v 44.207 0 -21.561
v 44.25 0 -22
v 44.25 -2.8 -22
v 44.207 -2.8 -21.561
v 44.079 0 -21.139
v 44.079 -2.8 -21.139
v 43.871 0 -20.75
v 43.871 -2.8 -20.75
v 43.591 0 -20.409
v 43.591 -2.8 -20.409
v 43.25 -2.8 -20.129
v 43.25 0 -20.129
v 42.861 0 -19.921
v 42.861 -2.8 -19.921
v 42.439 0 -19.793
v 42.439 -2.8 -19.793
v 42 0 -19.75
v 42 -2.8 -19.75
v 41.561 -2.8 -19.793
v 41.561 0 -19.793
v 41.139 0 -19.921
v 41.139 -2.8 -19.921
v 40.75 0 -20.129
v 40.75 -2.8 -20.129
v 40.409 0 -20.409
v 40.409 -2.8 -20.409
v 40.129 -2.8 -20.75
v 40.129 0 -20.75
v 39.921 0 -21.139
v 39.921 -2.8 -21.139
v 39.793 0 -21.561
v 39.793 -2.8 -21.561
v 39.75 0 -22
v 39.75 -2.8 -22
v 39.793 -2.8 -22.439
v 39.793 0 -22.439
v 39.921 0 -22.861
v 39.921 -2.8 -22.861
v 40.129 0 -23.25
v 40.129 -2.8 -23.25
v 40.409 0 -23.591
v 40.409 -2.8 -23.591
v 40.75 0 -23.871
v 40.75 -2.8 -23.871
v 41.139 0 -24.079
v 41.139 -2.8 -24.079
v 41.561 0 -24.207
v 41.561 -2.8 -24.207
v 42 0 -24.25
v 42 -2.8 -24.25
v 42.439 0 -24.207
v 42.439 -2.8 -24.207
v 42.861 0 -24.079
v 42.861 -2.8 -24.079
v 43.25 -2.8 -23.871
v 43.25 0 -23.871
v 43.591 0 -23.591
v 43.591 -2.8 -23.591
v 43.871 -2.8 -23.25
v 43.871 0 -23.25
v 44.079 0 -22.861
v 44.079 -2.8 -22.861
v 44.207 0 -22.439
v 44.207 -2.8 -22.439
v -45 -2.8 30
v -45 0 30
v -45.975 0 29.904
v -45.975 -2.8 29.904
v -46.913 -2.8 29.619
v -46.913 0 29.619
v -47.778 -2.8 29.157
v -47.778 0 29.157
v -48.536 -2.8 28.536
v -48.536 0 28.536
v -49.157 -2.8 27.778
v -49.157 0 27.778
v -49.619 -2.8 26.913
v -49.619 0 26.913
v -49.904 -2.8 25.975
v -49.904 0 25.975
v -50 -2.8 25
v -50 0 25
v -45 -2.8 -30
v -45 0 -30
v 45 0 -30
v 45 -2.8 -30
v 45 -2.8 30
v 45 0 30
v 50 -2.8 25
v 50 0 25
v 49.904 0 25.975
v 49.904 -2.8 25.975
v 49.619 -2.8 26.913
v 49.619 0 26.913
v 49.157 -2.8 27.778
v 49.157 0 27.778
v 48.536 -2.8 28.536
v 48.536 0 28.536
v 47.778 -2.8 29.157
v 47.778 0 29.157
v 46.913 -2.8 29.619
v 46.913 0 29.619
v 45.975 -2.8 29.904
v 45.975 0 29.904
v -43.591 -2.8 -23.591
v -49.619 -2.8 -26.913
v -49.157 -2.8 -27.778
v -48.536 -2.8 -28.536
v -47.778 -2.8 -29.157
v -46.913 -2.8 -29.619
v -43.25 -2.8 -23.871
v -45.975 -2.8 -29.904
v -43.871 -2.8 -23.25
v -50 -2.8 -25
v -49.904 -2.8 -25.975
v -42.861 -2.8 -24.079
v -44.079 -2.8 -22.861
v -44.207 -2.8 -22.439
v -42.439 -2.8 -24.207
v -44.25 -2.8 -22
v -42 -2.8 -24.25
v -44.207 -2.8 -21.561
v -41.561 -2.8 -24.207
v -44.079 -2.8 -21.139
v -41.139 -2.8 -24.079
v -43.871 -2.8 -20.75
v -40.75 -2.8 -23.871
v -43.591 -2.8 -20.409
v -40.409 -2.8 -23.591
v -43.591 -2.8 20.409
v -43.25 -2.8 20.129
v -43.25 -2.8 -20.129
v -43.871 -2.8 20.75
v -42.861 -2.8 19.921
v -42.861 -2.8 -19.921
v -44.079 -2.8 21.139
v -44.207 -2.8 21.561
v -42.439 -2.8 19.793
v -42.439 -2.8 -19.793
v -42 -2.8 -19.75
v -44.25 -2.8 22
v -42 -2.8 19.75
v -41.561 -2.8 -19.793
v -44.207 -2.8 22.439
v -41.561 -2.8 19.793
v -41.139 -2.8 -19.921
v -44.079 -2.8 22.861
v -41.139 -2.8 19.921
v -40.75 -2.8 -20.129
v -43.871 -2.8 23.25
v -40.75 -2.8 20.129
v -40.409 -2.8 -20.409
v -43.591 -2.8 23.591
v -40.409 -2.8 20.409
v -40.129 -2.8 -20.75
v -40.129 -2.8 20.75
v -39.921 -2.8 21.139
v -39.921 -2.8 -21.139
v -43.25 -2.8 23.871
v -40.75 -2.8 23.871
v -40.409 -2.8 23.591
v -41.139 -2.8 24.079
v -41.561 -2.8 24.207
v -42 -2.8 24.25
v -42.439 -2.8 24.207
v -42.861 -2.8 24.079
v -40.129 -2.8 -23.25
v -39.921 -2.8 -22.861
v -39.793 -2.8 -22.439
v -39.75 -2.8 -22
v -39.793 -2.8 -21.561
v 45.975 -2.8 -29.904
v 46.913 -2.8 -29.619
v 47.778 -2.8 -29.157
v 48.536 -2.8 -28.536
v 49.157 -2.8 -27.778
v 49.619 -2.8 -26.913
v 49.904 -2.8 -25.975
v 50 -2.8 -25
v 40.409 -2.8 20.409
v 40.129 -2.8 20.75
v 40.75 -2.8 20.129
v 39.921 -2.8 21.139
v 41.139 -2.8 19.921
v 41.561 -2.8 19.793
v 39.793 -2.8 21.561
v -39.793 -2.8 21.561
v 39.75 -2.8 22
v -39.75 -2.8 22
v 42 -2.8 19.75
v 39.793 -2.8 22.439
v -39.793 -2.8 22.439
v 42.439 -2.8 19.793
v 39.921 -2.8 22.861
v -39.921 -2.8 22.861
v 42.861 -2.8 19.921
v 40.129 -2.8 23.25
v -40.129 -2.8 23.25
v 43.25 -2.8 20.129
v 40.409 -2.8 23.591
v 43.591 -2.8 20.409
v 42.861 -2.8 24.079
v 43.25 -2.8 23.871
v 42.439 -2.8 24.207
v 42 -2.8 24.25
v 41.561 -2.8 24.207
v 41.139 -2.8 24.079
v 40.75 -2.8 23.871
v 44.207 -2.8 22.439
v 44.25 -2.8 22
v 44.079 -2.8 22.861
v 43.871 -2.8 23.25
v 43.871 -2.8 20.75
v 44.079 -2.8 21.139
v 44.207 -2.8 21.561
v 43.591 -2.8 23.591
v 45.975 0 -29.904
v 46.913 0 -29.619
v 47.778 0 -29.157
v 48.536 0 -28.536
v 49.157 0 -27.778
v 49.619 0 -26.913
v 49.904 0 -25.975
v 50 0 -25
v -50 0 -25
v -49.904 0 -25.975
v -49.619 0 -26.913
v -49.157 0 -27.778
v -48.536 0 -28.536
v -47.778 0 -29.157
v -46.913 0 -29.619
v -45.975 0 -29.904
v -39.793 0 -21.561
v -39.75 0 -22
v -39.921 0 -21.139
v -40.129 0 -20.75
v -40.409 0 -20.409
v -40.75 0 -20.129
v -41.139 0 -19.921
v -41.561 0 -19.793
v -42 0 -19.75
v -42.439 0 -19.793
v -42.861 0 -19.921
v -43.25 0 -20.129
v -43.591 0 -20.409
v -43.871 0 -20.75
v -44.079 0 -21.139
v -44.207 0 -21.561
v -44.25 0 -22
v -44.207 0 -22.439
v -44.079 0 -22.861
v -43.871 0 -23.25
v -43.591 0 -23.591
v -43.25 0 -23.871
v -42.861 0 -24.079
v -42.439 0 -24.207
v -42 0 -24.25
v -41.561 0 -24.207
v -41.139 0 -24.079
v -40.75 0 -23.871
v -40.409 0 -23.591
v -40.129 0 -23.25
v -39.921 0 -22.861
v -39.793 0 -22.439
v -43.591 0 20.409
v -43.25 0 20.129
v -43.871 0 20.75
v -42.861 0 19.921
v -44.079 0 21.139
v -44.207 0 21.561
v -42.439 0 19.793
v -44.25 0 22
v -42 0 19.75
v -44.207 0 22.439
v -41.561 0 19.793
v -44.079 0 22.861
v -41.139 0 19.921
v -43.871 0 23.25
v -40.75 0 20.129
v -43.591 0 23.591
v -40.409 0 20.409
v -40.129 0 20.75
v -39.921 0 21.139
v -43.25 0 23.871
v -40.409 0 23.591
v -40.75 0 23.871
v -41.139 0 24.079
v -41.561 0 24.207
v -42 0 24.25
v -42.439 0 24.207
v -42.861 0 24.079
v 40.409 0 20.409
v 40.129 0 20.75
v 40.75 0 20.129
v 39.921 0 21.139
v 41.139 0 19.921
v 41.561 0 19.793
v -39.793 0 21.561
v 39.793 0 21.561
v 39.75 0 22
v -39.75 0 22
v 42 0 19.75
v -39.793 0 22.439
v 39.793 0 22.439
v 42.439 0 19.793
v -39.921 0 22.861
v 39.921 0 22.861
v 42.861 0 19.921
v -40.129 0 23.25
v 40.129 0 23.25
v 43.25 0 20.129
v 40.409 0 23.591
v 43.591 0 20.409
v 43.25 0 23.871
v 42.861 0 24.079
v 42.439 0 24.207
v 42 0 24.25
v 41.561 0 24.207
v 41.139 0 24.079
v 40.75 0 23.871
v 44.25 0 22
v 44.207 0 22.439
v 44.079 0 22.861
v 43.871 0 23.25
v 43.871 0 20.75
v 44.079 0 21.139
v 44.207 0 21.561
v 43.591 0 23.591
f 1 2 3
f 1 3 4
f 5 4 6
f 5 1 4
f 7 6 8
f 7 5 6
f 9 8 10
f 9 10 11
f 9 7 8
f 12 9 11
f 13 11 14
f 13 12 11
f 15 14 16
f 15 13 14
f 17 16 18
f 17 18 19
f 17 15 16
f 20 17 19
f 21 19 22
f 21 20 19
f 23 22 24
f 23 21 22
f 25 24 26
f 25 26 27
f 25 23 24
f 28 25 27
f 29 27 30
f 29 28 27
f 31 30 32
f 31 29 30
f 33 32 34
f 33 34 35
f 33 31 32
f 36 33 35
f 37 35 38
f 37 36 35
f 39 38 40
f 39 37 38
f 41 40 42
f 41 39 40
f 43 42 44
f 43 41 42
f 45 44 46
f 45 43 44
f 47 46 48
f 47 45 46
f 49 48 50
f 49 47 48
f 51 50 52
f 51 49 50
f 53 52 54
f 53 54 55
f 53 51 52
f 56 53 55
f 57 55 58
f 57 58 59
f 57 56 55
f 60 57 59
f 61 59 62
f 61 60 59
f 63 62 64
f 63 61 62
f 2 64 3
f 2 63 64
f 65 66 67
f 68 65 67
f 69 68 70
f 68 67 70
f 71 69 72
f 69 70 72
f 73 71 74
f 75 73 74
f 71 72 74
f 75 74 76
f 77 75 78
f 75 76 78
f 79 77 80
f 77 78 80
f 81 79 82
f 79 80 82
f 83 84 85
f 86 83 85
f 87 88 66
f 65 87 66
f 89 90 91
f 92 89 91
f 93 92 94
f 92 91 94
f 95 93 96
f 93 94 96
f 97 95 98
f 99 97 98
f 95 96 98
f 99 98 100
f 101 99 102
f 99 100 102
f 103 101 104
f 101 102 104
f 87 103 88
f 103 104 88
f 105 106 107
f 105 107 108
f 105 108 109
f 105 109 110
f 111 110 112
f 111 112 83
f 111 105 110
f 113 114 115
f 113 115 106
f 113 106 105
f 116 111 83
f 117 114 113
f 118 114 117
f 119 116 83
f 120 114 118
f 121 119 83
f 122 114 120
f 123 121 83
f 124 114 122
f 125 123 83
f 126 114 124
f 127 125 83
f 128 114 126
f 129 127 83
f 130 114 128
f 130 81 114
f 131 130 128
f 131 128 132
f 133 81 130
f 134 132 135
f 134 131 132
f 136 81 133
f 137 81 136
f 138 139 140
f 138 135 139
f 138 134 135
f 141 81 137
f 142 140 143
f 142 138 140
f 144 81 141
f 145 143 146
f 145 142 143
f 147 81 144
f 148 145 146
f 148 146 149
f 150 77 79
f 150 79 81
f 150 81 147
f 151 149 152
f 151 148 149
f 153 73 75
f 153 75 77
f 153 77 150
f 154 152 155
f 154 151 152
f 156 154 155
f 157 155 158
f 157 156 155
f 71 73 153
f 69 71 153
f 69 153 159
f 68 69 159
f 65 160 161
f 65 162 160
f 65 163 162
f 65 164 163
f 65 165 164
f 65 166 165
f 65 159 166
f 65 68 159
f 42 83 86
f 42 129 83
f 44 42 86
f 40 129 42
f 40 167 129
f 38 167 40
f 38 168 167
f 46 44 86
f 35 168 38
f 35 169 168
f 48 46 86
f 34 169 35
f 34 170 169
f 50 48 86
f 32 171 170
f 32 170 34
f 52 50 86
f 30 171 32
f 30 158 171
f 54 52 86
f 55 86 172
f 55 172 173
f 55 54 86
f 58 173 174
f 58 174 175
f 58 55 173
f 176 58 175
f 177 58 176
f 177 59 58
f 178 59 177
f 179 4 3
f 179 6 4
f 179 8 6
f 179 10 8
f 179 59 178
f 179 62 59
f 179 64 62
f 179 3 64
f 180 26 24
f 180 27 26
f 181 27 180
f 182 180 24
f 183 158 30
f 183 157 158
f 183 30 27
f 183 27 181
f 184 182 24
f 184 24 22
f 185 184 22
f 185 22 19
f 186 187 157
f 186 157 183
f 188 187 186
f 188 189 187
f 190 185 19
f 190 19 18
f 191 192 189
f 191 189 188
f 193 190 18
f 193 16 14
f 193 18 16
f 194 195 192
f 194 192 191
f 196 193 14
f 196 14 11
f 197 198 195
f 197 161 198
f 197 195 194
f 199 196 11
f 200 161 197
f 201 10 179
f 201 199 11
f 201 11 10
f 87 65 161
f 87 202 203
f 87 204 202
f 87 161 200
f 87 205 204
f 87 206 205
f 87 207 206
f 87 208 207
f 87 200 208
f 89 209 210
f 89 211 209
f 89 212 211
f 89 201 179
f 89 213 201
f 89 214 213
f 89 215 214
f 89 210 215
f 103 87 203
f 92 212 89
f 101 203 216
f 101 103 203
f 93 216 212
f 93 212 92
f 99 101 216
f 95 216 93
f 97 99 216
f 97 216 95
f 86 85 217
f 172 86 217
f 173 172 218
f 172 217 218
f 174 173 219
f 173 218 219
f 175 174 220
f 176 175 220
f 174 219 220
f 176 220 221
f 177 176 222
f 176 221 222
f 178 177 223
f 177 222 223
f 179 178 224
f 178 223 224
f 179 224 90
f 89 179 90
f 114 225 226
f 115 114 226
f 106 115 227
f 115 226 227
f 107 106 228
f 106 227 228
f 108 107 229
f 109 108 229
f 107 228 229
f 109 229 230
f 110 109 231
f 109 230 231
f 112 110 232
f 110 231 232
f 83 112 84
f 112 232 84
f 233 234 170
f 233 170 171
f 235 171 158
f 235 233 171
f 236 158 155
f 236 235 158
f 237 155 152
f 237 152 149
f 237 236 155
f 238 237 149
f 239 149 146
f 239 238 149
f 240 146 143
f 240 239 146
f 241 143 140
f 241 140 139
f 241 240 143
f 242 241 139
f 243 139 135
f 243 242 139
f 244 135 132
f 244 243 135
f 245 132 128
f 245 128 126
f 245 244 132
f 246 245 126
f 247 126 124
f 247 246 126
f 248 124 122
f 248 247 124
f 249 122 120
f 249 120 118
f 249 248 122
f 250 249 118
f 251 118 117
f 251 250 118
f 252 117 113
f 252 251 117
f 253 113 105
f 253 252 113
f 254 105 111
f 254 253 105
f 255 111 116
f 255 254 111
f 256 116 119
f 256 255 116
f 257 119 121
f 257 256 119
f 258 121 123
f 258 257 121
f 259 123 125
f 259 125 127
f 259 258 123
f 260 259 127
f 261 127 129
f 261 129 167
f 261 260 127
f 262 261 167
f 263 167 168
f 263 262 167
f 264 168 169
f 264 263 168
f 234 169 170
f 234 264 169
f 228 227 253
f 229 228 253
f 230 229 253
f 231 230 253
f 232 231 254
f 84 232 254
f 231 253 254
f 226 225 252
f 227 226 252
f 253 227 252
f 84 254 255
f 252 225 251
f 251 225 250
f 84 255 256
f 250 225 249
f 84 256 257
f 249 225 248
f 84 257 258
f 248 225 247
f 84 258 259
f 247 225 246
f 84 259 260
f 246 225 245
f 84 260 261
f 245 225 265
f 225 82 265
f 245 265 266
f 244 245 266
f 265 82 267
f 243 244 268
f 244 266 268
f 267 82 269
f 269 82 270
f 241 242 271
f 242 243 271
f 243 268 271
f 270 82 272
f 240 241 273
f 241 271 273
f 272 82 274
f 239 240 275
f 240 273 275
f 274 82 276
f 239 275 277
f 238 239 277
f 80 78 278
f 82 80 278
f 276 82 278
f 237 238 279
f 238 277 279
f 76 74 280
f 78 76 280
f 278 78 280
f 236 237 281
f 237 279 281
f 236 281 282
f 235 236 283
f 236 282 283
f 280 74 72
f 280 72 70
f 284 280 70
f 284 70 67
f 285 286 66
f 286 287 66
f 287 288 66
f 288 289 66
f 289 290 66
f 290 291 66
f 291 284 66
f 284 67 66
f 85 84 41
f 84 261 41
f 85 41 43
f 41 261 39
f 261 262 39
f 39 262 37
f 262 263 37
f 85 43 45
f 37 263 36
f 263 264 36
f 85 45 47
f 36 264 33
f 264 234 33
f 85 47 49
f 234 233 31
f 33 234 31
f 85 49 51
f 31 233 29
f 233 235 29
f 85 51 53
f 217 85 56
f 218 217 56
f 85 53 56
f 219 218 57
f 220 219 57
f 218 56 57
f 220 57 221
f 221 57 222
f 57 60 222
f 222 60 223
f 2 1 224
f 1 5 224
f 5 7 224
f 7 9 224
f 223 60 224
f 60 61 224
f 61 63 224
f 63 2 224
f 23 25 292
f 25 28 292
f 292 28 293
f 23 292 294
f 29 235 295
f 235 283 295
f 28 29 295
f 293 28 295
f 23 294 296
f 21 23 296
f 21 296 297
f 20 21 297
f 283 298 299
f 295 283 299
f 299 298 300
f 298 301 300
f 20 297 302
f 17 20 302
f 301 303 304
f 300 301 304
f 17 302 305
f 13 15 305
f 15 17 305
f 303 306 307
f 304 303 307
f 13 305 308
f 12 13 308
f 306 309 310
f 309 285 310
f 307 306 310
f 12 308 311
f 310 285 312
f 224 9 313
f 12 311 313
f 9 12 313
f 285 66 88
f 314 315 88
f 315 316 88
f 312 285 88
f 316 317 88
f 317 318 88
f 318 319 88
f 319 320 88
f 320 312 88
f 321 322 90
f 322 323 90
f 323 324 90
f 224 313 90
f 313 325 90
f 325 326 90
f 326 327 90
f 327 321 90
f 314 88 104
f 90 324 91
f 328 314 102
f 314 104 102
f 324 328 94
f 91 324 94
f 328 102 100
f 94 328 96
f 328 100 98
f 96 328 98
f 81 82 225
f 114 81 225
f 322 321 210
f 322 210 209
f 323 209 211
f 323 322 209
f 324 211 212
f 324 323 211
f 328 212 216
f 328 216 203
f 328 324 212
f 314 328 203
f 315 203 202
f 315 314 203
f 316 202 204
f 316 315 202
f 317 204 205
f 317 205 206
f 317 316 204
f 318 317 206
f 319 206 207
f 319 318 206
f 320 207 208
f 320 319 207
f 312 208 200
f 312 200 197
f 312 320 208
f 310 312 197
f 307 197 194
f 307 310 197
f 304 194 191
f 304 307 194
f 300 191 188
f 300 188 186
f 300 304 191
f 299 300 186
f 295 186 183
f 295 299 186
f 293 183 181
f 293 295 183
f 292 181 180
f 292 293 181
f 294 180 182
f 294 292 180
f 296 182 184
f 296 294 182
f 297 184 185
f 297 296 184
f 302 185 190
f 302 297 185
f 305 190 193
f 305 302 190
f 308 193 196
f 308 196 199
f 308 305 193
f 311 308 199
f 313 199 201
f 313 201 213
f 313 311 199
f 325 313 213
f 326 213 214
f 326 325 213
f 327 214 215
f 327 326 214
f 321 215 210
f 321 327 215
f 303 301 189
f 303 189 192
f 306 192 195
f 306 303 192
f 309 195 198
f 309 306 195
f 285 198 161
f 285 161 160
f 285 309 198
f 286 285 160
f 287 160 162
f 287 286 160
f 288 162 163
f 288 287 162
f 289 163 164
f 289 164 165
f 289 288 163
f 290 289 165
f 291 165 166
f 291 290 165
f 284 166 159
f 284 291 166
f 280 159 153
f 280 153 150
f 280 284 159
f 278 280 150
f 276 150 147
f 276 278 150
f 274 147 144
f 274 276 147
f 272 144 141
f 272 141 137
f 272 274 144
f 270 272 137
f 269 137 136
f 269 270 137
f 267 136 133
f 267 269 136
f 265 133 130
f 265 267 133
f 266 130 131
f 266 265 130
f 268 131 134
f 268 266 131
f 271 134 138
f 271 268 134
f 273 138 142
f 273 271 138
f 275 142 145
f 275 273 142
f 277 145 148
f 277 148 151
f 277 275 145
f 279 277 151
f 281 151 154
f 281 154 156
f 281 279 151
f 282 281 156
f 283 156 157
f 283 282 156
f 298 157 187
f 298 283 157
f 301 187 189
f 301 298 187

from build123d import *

# Parameters (mm, degrees)
F0_R     = 2.25
F1_DEPTH = 2.8


with BuildPart() as f1:
    # F0 (on Front) → F1 (new body)
    with BuildSketch(Plane.XZ):
        with BuildLine():
            Line((-45, -30), (45, -30))
            ThreePointArc((45, -30), (48.535534, -28.535534), (50, -25))
            Line((50, -25), (50, 25))
            ThreePointArc((50, 25), (48.535534, 28.535534), (45, 30))
            Line((45, 30), (-45, 30))
            ThreePointArc((-45, 30), (-48.535534, 28.535534), (-50, 25))
            Line((-50, 25), (-50, -25))
            ThreePointArc((-50, -25), (-48.535534, -28.535534), (-45, -30))
        make_face()
        with BuildLine():
            ThreePointArc((45, 27.000001), (46.414214, 26.414214), (47.000001, 25))
            Line((47.000001, 25), (47.000001, -25))
            ThreePointArc((47.000001, -25), (46.414214, -26.414214), (45, -27.000001))
            Line((45, -27.000001), (-45, -27.000001))
            ThreePointArc((-45, -27.000001), (-46.414214, -26.414214), (-47.000001, -25))
            Line((-47.000001, -25), (-47.000001, 25))
            ThreePointArc((-47.000001, 25), (-46.414214, 26.414214), (-45, 27.000001))
            Line((-45, 27.000001), (45, 27.000001))
        make_face(mode=Mode.SUBTRACT)
        with BuildLine():
            Line((47.000001, -25), (47.000001, 25))
            ThreePointArc((47.000001, 25), (46.414214, 26.414214), (45, 27.000001))
            Line((45, 27.000001), (-45, 27.000001))
            ThreePointArc((-45, 27.000001), (-46.414214, 26.414214), (-47.000001, 25))
            Line((-47.000001, 25), (-47.000001, -25))
            ThreePointArc((-47.000001, -25), (-46.414214, -26.414214), (-45, -27.000001))
            Line((-45, -27.000001), (45, -27.000001))
            ThreePointArc((45, -27.000001), (46.414214, -26.414214), (47.000001, -25))
        make_face()
        with Locations((-42, -22)):
            Circle(F0_R, mode=Mode.SUBTRACT)
        with Locations((42, -22)):
            Circle(F0_R, mode=Mode.SUBTRACT)
        with Locations((-42, 22)):
            Circle(F0_R, mode=Mode.SUBTRACT)
        with Locations((42, 22)):
            Circle(F0_R, mode=Mode.SUBTRACT)
    extrude(amount=F1_DEPTH)


solid = f1.part
